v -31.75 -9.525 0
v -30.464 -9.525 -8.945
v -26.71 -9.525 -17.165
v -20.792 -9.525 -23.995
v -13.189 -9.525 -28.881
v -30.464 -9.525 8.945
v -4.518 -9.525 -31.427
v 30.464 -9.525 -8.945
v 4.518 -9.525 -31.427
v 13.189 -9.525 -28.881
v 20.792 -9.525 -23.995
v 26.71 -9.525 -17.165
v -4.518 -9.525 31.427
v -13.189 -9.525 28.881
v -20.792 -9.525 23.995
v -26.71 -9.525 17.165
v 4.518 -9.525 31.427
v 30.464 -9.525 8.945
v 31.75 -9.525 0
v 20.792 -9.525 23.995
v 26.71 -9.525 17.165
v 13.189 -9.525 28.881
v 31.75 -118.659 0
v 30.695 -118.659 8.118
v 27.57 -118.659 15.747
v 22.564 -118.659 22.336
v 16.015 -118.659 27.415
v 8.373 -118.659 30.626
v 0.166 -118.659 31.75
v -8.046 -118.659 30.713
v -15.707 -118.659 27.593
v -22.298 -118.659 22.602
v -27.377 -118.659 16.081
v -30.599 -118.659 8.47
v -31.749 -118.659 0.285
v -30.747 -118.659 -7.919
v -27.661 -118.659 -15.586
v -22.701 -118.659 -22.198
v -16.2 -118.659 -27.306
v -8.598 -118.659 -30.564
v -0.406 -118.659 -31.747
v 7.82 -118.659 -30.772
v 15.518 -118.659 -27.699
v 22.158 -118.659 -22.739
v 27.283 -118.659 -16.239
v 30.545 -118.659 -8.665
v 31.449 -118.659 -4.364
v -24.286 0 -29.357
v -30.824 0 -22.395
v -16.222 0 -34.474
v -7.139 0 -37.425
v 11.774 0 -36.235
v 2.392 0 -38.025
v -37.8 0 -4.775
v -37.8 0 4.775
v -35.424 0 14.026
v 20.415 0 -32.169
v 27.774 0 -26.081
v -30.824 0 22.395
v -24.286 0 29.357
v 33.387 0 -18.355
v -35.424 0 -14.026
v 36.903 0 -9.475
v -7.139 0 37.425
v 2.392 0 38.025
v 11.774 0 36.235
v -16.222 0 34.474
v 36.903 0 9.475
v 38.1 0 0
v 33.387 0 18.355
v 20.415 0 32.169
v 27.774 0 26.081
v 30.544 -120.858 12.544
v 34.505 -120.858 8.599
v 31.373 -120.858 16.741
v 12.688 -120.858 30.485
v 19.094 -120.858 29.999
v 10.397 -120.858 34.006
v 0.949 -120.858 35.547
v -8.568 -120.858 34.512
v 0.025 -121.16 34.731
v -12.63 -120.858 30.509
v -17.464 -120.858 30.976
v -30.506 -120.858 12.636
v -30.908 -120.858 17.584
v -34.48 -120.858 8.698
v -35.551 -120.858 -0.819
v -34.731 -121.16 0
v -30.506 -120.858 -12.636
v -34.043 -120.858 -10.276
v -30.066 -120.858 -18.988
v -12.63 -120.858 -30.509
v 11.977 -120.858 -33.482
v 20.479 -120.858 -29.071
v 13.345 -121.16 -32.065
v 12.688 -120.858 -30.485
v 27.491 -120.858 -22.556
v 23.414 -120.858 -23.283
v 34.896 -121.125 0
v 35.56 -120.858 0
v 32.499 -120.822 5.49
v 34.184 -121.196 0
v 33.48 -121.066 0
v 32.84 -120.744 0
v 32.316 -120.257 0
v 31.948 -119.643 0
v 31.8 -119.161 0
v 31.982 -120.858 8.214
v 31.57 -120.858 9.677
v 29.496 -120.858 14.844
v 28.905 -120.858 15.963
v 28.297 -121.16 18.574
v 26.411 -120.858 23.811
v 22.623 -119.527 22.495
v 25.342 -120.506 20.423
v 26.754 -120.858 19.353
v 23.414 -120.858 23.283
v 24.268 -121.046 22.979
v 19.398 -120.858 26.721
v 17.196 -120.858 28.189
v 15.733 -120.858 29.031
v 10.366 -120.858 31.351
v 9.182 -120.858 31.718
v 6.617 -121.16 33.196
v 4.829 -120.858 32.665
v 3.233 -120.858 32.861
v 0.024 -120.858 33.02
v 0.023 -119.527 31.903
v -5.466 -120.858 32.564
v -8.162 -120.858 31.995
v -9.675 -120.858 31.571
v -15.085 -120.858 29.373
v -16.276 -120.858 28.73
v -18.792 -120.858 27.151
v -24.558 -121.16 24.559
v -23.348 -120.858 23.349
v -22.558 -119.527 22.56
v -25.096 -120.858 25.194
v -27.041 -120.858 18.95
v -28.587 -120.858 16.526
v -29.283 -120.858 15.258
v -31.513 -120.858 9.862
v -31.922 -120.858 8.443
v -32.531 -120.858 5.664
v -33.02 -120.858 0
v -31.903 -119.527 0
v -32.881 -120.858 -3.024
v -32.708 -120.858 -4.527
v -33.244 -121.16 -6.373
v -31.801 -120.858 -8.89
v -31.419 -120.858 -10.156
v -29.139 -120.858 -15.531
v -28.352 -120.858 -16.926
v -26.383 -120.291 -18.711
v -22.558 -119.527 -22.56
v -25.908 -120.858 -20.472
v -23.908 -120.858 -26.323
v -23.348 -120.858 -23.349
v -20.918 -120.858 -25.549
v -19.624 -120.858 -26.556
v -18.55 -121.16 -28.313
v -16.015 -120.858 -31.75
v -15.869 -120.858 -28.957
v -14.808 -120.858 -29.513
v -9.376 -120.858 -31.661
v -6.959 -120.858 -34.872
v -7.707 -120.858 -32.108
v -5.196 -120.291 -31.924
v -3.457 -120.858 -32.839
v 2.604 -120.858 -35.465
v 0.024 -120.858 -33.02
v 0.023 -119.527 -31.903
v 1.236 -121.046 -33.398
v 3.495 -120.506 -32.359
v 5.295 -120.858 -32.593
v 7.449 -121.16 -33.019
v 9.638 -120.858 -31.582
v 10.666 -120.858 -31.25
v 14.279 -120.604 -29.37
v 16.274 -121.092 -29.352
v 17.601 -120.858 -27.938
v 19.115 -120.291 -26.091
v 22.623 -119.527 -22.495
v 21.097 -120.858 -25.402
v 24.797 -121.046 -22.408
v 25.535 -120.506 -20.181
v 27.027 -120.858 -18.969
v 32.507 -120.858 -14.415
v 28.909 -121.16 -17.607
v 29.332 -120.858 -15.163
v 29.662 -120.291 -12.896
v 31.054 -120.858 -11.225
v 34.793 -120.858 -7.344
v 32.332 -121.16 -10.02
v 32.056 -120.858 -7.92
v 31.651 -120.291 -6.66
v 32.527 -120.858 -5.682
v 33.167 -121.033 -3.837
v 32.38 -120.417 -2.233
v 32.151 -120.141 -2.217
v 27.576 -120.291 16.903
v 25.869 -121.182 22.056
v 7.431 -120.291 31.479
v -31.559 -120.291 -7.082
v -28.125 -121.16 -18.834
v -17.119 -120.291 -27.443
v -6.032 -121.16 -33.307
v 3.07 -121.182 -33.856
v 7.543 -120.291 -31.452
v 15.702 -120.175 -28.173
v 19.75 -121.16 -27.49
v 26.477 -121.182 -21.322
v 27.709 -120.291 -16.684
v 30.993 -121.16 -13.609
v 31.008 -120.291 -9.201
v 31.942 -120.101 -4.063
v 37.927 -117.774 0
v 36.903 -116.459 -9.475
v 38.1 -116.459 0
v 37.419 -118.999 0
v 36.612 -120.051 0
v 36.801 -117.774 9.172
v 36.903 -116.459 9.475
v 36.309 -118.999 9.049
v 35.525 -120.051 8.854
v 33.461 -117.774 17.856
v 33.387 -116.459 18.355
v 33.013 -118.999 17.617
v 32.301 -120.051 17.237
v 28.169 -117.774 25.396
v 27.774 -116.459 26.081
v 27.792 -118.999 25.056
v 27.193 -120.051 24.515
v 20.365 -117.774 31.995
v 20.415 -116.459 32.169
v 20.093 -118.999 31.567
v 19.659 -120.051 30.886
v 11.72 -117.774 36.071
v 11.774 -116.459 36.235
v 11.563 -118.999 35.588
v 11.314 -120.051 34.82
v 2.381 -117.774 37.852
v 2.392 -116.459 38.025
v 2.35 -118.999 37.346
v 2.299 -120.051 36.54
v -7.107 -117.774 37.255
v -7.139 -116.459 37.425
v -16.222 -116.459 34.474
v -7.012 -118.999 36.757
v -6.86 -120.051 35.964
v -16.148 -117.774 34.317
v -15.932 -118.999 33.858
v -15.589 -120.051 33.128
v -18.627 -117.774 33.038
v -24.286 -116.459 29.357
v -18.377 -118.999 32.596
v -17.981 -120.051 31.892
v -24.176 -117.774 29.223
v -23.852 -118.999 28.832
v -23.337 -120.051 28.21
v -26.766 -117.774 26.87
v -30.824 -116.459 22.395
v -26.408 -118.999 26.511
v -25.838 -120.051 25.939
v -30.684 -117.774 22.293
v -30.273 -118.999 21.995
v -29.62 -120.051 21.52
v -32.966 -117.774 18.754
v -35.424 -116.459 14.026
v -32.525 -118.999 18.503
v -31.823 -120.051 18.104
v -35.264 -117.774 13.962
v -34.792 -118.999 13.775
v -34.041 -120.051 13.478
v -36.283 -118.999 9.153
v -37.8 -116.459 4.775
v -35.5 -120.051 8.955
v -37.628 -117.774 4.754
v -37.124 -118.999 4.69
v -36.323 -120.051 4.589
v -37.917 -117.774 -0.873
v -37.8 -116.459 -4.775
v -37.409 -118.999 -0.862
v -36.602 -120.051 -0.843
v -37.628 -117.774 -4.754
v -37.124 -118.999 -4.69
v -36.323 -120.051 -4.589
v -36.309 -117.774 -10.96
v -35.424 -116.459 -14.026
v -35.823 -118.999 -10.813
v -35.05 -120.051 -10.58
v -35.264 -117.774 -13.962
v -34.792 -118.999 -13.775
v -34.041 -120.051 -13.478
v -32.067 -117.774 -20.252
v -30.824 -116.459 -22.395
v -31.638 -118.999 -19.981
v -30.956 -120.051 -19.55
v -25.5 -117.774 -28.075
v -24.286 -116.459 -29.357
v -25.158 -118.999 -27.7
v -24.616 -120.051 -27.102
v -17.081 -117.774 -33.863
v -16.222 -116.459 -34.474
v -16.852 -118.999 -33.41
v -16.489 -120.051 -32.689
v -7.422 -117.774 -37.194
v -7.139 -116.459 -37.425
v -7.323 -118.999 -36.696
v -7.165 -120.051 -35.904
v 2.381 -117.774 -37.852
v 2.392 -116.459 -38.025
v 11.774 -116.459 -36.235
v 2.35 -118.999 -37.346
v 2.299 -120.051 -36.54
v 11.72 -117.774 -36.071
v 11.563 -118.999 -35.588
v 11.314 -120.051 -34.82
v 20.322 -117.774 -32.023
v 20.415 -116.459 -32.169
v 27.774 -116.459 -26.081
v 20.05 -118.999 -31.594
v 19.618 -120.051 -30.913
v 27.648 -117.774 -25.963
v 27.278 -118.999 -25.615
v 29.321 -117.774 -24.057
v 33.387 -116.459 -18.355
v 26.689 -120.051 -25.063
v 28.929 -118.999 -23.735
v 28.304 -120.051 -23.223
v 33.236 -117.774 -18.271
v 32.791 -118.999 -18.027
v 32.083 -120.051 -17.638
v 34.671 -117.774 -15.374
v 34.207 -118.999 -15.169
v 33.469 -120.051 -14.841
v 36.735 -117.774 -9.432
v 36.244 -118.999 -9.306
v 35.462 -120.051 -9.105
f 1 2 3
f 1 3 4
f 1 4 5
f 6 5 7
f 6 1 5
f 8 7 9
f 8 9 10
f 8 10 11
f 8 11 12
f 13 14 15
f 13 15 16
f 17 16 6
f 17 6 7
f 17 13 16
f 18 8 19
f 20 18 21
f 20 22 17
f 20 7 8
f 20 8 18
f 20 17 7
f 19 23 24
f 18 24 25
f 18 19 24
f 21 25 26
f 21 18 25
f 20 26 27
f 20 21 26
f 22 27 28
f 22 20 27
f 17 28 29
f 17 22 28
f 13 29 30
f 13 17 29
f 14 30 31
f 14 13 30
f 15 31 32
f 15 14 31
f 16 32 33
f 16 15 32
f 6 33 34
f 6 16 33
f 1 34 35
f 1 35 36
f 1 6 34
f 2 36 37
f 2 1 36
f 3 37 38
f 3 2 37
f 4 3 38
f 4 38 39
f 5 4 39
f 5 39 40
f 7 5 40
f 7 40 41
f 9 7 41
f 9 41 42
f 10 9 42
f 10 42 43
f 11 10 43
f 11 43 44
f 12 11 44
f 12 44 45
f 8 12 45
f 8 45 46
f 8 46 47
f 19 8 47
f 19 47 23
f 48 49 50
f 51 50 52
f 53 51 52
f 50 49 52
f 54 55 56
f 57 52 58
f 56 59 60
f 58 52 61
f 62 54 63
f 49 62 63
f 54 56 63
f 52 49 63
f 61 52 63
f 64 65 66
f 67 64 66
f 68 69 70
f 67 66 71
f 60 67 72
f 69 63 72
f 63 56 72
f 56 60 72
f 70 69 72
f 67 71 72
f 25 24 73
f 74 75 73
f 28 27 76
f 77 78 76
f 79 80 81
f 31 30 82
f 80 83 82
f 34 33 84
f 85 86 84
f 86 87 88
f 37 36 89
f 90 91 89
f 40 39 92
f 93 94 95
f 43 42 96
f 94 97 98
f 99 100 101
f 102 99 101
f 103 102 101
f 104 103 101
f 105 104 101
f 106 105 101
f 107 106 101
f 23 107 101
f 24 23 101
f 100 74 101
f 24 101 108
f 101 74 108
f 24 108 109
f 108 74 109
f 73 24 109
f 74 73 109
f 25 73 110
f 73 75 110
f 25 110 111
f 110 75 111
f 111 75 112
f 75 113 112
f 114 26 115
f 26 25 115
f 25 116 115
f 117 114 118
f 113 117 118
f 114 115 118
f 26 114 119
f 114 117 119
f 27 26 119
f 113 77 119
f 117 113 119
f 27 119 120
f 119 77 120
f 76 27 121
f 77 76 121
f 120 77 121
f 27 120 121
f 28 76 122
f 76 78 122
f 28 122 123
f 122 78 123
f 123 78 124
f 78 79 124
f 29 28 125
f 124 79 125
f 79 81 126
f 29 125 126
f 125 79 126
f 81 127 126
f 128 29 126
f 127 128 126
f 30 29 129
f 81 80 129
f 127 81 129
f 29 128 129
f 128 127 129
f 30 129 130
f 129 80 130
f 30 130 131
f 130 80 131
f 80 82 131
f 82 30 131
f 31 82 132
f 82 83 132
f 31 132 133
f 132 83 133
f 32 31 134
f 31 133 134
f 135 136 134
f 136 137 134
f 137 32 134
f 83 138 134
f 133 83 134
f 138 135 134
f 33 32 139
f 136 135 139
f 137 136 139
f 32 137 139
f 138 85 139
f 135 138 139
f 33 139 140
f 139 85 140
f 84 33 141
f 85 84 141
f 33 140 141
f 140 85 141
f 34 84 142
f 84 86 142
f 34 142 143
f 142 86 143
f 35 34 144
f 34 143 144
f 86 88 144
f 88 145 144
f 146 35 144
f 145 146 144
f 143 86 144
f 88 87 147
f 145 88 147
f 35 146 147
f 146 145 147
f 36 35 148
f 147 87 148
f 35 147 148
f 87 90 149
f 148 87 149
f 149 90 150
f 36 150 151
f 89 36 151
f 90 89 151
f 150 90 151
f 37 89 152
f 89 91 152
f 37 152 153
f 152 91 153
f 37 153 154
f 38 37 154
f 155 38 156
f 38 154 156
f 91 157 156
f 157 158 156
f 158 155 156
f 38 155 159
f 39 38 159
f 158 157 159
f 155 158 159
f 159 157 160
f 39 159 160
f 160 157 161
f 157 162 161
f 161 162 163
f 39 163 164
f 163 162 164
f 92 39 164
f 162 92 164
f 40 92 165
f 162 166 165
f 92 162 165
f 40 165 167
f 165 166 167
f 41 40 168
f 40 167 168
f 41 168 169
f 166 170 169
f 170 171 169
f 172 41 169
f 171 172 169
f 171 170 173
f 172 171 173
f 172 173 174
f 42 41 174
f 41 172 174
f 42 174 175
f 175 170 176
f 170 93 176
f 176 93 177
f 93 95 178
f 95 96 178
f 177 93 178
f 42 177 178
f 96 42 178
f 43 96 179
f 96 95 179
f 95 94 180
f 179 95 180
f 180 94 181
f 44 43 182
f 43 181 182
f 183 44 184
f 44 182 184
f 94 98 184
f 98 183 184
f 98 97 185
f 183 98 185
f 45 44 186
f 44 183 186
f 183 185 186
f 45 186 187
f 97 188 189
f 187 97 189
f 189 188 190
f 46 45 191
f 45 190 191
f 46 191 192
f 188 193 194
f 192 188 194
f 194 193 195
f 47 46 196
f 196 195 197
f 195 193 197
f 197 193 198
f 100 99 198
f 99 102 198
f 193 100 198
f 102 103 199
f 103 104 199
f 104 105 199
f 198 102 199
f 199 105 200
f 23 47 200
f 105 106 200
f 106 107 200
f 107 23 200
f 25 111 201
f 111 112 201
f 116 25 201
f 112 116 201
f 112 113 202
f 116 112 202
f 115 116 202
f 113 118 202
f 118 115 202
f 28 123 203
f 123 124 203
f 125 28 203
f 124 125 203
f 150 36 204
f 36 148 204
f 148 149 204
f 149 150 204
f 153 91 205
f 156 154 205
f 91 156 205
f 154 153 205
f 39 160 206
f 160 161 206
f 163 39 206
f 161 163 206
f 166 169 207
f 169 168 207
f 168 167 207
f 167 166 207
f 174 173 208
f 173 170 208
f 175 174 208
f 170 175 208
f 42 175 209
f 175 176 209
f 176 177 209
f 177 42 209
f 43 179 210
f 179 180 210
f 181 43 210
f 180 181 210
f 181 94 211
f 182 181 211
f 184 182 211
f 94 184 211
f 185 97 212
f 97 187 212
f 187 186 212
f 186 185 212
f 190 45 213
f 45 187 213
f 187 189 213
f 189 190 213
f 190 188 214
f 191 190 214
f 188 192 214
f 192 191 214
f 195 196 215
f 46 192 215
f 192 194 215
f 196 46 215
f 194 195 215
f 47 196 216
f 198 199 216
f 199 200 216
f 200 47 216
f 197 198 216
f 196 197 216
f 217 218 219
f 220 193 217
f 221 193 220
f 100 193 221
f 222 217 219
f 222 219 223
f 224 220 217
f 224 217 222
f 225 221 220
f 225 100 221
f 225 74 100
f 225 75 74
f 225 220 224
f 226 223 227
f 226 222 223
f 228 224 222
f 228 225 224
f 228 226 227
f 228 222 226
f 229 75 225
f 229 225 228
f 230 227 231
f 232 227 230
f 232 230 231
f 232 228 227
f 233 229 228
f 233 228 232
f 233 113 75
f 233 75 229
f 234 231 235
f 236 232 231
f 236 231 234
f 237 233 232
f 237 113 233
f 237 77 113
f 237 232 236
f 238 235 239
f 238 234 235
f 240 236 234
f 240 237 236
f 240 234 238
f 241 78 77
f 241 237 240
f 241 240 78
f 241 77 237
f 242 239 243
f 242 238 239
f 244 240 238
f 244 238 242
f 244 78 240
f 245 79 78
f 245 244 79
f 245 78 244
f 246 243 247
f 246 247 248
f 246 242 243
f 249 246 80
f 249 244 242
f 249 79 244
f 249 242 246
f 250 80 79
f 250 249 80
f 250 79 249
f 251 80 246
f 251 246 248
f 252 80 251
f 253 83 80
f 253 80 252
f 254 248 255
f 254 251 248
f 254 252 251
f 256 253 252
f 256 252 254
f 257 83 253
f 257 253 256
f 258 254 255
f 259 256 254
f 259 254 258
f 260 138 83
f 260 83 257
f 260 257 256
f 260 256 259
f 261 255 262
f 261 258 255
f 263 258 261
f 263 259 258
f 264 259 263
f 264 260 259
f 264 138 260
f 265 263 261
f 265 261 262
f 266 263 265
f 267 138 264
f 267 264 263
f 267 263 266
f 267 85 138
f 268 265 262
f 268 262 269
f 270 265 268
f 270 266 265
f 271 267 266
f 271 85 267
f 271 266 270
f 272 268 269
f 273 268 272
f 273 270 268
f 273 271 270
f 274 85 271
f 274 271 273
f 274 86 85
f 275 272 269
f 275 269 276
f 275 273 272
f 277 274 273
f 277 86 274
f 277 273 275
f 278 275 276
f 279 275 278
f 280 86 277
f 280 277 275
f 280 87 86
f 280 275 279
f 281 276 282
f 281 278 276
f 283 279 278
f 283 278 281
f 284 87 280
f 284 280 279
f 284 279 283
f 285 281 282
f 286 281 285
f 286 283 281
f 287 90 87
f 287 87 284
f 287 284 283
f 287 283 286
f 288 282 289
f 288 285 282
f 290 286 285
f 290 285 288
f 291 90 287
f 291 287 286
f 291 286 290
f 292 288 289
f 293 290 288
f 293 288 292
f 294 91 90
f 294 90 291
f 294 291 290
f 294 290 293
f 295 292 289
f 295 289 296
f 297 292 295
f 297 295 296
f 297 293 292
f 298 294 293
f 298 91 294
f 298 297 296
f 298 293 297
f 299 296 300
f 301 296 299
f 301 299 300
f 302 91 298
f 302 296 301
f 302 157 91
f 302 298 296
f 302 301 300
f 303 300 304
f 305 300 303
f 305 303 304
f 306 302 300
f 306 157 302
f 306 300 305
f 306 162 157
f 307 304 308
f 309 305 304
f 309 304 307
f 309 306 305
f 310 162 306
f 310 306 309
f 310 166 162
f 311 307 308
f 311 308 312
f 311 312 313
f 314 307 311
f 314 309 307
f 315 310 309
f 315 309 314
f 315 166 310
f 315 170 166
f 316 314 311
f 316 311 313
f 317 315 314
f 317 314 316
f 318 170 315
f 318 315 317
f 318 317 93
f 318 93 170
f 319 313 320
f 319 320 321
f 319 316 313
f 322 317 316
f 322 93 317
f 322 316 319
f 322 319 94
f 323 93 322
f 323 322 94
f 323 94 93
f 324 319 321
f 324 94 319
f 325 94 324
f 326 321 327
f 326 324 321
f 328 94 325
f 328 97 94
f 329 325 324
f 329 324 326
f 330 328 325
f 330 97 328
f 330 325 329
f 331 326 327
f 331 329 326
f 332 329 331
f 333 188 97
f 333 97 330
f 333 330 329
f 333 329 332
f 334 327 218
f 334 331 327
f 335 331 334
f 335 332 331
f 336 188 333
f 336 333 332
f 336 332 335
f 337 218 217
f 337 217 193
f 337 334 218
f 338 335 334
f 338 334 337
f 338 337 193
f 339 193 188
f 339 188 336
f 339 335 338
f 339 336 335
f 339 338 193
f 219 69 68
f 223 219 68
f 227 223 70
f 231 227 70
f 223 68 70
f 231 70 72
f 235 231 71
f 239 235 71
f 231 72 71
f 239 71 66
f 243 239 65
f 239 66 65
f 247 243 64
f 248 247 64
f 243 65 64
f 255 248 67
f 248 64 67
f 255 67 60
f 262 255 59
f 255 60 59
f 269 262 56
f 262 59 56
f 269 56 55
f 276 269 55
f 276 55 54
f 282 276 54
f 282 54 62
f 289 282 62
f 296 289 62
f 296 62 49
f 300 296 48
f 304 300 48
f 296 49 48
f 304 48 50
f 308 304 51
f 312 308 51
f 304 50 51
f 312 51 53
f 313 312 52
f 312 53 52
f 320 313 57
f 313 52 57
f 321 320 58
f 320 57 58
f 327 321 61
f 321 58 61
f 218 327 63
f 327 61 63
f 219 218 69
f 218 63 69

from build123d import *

# Parameters (mm, degrees)
F0_R     = 38.1
F0_R_2   = 31.75
F1_DEPTH = 121.539
F2_DEPTH = 9.525
F3_R     = 5.08
F4_R     = 2.54


# Not quite as in the source:
# - a length typed as a fraction of an inch, garbled in the dataset ("3 / 203.2 mm" for 3/8 in), is restored


with BuildPart() as f1:
    # F0 (on Front) → F1 (new body)
    with BuildSketch(Plane.XZ):
        Circle(F0_R)
        Circle(F0_R_2, mode=Mode.SUBTRACT)
    extrude(amount=F1_DEPTH)

    # F0 (on Front) → F2 (join)
    with BuildSketch(Plane.XZ):
        Circle(F0_R_2)
    extrude(amount=F2_DEPTH)

    # F3
    f3_edges = [f1.edges().sort_by_distance(p)[0] for p in [
        (-38.1, -121.539, 0),
    ]]
    fillet(f3_edges, radius=F3_R)

    # F4
    f4_edges = [f1.edges().sort_by_distance(p)[0] for p in [
        (-31.75, -121.539, 0),
    ]]
    fillet(f4_edges, radius=F4_R)


solid = f1.part
